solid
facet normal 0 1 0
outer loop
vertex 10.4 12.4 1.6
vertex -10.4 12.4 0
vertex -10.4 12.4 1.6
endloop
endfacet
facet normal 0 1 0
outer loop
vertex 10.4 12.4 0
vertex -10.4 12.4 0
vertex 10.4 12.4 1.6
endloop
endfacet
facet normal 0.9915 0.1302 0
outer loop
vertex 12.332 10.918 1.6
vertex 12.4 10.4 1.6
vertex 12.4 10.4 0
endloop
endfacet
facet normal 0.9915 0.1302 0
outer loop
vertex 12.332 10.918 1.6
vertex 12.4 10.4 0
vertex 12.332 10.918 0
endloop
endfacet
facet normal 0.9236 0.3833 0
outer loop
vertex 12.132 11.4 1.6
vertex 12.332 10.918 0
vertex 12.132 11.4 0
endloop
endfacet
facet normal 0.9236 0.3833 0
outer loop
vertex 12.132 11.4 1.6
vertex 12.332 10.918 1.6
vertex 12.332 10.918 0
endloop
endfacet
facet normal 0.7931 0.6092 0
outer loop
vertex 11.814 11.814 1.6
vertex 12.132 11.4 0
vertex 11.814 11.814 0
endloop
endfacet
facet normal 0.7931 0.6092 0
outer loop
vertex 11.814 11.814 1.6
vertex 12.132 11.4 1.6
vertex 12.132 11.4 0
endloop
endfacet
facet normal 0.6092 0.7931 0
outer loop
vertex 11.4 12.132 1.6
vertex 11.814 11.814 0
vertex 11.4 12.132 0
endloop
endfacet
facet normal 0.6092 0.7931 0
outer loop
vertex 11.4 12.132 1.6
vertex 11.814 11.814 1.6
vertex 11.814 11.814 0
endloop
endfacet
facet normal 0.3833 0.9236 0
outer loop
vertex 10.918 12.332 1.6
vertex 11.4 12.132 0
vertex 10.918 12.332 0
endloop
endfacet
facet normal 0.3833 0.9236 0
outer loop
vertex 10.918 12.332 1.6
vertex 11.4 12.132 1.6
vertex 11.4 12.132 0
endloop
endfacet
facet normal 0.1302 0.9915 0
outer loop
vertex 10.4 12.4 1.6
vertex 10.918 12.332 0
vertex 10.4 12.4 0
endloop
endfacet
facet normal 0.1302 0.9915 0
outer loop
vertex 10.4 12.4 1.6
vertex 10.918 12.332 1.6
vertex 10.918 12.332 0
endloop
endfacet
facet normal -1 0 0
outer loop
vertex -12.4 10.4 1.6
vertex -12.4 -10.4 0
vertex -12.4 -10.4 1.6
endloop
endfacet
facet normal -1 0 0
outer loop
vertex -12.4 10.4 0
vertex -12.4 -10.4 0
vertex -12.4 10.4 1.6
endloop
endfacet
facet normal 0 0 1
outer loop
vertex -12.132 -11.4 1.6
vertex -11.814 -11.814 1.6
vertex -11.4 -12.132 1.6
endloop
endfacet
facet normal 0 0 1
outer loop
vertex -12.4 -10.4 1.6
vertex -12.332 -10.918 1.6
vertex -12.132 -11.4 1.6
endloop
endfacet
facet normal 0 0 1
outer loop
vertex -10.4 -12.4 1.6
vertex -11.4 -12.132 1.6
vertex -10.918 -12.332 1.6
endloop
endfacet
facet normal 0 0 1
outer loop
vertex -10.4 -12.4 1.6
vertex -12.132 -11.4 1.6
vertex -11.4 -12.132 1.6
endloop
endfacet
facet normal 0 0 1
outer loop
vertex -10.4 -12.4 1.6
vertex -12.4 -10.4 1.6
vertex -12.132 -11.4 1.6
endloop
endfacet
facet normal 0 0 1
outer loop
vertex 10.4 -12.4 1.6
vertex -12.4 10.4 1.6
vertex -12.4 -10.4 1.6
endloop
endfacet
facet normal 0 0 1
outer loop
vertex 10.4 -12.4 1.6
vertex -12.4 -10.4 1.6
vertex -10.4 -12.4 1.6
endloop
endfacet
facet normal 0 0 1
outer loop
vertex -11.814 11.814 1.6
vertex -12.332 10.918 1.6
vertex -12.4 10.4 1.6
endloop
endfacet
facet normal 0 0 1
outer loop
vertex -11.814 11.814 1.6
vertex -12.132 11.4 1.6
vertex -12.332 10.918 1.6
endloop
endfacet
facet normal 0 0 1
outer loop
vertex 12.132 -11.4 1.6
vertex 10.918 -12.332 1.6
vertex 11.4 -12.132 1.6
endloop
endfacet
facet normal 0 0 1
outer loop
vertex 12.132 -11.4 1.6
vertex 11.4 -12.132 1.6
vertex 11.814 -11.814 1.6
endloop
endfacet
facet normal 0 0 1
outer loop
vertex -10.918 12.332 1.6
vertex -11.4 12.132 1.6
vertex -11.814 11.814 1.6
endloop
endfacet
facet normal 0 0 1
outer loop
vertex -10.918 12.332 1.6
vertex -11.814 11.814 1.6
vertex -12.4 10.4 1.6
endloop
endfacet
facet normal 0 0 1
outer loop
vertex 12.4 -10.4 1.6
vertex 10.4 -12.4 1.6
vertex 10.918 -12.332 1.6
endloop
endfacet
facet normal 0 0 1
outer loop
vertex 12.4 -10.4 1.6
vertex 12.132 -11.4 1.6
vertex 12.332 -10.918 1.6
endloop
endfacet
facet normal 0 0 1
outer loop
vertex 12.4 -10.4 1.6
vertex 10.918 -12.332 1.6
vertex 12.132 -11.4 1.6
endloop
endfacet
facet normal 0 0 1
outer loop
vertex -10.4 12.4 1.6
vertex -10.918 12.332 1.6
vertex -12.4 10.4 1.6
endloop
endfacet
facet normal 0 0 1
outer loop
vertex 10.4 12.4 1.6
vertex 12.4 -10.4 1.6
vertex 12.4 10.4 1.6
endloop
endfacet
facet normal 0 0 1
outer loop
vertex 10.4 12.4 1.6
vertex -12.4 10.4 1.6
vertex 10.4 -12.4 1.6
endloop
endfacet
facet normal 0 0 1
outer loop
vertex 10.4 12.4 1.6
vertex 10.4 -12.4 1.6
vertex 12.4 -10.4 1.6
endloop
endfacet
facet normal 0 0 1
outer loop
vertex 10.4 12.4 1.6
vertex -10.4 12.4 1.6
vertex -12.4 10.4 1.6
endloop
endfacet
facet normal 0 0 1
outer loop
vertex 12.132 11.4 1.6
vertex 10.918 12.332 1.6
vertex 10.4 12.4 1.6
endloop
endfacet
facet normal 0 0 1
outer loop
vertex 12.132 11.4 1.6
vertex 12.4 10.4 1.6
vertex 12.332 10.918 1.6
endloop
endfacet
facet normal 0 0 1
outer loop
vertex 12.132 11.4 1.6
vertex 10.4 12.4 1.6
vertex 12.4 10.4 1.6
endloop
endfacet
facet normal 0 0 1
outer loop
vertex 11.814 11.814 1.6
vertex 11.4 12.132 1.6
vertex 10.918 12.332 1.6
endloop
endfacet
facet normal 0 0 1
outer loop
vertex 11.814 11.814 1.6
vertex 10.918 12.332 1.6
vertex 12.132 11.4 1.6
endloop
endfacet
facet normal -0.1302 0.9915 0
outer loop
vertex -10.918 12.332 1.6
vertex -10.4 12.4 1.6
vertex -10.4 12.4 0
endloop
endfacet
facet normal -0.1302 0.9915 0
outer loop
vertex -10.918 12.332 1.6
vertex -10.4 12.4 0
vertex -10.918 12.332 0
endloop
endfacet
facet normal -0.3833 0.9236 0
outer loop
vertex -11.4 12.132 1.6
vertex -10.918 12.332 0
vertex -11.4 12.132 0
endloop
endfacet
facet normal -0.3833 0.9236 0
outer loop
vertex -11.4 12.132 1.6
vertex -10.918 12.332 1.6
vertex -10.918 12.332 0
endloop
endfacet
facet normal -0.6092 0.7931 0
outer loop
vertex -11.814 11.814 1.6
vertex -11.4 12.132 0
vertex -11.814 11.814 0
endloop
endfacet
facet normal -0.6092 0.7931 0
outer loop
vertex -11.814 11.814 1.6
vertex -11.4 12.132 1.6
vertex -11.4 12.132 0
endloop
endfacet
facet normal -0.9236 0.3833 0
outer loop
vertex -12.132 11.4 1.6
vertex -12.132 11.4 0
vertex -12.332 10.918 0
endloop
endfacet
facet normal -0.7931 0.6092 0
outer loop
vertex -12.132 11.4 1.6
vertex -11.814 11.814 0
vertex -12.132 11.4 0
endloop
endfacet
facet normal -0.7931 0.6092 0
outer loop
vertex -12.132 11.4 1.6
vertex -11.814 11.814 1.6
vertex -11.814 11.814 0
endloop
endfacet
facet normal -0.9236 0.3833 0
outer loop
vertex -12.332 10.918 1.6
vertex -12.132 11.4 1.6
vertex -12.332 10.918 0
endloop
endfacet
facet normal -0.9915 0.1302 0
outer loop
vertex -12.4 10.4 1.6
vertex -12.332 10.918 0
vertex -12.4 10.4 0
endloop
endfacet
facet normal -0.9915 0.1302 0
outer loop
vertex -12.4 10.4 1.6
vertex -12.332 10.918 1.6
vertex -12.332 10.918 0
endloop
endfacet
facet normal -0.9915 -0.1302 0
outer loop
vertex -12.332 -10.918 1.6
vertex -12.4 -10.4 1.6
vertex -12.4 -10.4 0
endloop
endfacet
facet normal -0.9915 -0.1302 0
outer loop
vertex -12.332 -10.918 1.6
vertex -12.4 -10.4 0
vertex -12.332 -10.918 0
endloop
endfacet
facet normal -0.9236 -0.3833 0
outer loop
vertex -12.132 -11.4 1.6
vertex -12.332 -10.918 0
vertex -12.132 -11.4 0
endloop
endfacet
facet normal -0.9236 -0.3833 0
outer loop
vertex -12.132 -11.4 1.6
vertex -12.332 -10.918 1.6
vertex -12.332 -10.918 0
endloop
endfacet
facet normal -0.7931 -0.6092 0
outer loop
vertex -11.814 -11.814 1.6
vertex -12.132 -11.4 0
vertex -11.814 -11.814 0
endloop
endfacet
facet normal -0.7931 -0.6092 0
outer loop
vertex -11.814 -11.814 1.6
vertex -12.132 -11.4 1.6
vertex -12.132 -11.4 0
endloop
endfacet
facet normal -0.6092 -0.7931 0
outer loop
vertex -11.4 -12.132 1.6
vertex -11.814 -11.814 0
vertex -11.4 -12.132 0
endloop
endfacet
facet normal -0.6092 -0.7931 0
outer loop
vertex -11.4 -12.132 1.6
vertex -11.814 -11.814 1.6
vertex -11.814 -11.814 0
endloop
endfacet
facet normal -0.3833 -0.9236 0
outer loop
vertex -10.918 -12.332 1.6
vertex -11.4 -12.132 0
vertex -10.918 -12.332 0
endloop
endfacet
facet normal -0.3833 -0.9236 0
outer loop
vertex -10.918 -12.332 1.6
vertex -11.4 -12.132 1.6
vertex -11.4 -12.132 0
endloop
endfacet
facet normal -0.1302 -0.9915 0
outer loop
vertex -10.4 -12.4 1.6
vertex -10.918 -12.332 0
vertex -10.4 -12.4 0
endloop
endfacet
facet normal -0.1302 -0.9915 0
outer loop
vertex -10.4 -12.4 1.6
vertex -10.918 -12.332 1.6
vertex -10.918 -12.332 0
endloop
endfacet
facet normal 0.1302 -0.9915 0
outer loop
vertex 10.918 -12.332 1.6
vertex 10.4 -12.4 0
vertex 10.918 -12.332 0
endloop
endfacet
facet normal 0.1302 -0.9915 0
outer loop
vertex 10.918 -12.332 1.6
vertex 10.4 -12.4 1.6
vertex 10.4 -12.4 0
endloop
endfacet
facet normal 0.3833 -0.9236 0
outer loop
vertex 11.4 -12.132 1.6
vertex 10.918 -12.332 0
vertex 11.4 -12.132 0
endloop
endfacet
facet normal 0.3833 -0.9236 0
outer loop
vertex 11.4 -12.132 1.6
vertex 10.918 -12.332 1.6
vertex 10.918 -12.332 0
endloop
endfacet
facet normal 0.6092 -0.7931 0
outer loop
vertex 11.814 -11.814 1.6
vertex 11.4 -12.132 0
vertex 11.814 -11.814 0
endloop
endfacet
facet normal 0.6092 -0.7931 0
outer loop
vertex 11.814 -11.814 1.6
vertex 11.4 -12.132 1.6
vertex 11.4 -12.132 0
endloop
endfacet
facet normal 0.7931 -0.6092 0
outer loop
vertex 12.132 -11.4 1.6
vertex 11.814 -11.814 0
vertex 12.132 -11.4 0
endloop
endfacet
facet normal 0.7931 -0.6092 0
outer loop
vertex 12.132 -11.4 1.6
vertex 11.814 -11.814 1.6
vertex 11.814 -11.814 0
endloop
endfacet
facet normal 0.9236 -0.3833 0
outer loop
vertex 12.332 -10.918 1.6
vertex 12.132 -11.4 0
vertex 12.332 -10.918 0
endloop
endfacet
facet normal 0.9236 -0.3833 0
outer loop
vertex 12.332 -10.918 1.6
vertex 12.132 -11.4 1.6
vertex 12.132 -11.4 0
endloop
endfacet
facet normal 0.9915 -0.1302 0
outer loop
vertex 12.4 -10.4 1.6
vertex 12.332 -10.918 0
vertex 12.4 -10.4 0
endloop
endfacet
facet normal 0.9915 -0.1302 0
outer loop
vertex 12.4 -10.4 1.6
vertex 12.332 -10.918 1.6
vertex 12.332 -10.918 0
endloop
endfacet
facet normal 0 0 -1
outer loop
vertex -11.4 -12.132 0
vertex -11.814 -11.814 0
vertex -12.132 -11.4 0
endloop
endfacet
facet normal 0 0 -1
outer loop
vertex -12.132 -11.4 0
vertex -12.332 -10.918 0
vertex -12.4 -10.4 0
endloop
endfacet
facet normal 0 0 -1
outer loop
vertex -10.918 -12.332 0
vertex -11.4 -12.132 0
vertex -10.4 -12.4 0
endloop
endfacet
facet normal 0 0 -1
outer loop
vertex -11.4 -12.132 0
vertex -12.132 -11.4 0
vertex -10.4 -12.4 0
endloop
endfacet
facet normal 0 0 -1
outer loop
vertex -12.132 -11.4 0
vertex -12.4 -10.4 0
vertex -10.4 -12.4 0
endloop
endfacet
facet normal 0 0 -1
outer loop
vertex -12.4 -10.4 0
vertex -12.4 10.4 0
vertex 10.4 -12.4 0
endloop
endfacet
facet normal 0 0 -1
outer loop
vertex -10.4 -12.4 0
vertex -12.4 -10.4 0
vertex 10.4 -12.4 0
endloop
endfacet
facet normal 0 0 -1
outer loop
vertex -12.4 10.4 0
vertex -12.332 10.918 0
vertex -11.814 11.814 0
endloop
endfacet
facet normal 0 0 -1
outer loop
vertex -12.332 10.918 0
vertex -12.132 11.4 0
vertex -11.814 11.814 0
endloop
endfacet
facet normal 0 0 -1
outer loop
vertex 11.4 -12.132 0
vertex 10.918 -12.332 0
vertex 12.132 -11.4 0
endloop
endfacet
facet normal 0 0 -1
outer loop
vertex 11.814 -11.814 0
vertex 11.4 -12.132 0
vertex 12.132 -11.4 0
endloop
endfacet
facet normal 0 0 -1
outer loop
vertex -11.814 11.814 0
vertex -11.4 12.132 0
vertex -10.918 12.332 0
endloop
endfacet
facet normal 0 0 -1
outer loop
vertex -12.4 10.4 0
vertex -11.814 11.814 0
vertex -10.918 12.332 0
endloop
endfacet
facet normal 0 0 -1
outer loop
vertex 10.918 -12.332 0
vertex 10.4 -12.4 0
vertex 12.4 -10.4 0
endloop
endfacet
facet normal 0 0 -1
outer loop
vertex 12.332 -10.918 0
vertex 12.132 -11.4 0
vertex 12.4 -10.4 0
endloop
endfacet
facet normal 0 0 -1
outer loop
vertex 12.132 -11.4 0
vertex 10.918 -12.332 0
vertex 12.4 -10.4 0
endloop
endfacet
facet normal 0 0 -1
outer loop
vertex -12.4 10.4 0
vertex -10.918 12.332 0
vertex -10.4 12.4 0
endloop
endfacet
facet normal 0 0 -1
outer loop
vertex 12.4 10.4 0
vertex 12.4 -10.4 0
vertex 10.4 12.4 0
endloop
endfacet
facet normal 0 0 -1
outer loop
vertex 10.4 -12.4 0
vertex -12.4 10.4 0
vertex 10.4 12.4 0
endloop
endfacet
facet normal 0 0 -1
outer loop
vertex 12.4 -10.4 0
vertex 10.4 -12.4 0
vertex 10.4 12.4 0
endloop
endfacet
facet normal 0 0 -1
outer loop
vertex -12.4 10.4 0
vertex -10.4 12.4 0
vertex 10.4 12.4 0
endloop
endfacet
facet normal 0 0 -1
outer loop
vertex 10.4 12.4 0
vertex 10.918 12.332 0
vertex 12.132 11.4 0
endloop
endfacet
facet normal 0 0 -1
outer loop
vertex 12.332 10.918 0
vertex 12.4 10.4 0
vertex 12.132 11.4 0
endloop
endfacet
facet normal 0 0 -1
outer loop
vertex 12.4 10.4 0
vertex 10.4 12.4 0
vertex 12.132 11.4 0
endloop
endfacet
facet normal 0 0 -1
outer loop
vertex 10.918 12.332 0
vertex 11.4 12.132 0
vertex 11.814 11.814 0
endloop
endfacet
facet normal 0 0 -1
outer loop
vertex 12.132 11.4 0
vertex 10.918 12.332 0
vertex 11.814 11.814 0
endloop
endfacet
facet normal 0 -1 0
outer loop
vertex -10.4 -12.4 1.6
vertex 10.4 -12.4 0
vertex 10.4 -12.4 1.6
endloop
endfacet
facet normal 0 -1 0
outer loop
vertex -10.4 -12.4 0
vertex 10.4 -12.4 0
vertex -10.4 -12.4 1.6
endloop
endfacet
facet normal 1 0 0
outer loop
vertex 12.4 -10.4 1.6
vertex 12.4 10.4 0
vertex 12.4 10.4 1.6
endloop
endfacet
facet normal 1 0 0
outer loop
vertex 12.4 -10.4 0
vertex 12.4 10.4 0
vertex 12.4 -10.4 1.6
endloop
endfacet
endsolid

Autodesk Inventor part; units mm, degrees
ref_plane "YZ Plane" through (0, 0, 0) normal (1, 0, 0) x (0, 1, 0)
ref_plane "XZ Plane" through (0, 0, 0) normal (0, 1, 0) x (-1, 0, 0)
ref_plane "XY Plane" through (0, 0, 0) normal (0, 0, 1) x (1, 0, 0)
sketch "Sketch3" plane through (0, 0, 0) normal (0, 0, 1) x (1, 0, 0)
  line L0 (12.3999, -12.3999) -> (-12.3999, -12.3999)
  line L1 (-12.3999, -12.3999) -> (-12.3999, 12.3999)
  line L2 (-12.3999, 12.3999) -> (12.3999, 12.3999)
  line L3 (12.3999, 12.3999) -> (12.3999, -12.3999)
  line L4 (12.3999, -12.3999) -> (-12.3999, 12.3999) construction
  line L5 (-12.3999, -12.3999) -> (12.3999, 12.3999) construction
  point P0 (0, 0)
extrude "Extrusion2" add sketch "Sketch3" along normal blind 1.6
fillet "Fillet2" radius 2 4 edges at (12.3999, 12.3999, 0.8) (-12.3999, 12.3999, 0.8) (12.3999, -12.3999, 0.8) (-12.3999, -12.3999, 0.8)
properties part number "pcb_placeholder"
